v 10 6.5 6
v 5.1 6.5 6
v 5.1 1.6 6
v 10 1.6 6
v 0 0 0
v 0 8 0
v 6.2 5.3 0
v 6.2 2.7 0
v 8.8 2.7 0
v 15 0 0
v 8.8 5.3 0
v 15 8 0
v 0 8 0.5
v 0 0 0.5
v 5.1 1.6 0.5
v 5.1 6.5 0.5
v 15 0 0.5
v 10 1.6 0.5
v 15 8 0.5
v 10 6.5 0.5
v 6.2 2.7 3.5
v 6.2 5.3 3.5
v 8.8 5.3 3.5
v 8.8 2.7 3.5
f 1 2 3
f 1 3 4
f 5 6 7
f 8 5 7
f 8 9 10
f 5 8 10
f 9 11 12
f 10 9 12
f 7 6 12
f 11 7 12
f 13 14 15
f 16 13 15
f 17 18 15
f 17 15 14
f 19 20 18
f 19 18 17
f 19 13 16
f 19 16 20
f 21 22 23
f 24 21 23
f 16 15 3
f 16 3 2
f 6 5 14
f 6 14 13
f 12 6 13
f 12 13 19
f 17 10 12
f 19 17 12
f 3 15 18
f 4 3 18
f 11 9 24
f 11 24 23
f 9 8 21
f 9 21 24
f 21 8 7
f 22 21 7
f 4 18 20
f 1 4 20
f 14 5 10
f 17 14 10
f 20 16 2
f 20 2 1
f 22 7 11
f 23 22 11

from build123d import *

# Parameters (mm, degrees)
SKETCH001_W  = 2.6
SKETCH001_H  = 2.6
PAD_DEPTH    = 3.5
SKETCH_W     = 15
SKETCH_H     = 8
PAD001_DEPTH = 0.5
SKETCH002_W  = 4.9
SKETCH002_H  = 4.9
PAD002_DEPTH = 6


with BuildPart() as pad:
    # Sketch001 → Pad (new body)
    with BuildSketch(Plane.XY):
        with Locations((7.5, 4)):
            Rectangle(SKETCH001_W, SKETCH001_H)
    extrude(amount=PAD_DEPTH)


with BuildPart() as pad001:
    # Sketch → Pad001 (new body)
    with BuildSketch(Plane.XY):
        with Locations((7.5, 4)):
            Rectangle(SKETCH_W, SKETCH_H)
    extrude(amount=PAD001_DEPTH)


with BuildPart() as cut:
    # Sketch002 → Pad002 (new body)
    with BuildSketch(Plane.XY):
        with Locations((7.55, 4.05)):
            Rectangle(SKETCH002_W, SKETCH002_H)
    extrude(amount=PAD002_DEPTH)

    # Fusion: union Pad001
    add(pad001.part)

    # Cut: cut Pad
    add(pad.part, mode=Mode.SUBTRACT)


solid = cut.part
